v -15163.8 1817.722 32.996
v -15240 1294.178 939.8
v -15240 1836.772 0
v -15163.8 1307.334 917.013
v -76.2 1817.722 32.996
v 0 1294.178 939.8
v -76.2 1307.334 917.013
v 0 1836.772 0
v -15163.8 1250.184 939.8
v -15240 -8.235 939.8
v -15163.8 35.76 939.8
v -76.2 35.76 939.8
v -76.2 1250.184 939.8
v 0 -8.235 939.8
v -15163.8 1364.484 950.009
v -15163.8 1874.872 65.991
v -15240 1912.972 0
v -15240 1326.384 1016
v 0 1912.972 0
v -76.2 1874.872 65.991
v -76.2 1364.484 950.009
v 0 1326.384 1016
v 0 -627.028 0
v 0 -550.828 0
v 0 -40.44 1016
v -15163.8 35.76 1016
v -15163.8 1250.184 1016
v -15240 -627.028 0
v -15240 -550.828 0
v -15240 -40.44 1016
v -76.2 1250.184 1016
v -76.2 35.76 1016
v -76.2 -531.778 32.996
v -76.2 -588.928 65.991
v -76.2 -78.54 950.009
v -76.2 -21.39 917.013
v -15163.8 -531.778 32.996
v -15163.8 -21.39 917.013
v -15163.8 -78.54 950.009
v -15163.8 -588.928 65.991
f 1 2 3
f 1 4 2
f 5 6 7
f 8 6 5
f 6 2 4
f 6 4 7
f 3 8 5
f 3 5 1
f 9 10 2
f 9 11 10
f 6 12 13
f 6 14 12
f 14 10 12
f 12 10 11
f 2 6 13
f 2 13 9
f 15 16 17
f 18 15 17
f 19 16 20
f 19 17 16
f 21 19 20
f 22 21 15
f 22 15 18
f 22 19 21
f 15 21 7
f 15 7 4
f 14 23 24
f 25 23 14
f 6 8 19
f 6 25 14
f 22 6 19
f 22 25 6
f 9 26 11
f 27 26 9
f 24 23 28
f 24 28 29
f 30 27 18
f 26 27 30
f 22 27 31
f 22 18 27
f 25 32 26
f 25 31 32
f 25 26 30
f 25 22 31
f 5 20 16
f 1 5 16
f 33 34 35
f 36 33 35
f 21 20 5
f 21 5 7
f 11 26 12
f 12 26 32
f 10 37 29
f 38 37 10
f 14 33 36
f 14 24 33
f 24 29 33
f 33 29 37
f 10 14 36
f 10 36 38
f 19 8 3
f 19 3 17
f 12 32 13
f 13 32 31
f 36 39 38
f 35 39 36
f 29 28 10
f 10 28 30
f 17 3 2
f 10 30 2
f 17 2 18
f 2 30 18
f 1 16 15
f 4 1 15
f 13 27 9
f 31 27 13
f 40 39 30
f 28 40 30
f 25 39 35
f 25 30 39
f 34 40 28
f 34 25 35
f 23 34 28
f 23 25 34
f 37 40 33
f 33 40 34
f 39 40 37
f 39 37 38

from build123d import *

# Parameters (mm, degrees)
F1_DEPTH = 15240
F2_W     = 15087.6
F2_H     = 1020.7757469933
F3_DEPTH = 76.2
F4_W     = 15087.6
F4_H     = 1214.4242530067
F5_DEPTH = 76.2
F6_W     = 15087.6
F6_H     = 1020.7757469933
F7_DEPTH = 76.2


with BuildPart() as f1:
    # F0 (on Right) → F1 (new body)
    with BuildSketch(Plane.YZ):
        Polygon((-40.4404837035, 1016), (-627.0283572002, 0), (-550.8283572002, 0), (-8.2345742158, 939.8), (1294.1778598154, 939.8), (1836.7716427998, 0), (1912.9716427998, 0), (1326.3837693031, 1016), align=None)
    extrude(amount=-F1_DEPTH)

    # F2 (on face) → F3 (cut)
    with BuildSketch(Plane(origin=(0, -470.2712679001, 271.5112431143), x_dir=(1, 0, 0), z_dir=(0, -0.8660254038, 0.5))):
        with Locations((-7620, 273.0736948966)):
            Rectangle(F2_W, F2_H)
    extrude(amount=-F3_DEPTH, mode=Mode.SUBTRACT)

    # F4 (on face) → F5 (cut)
    with BuildSketch(Plane.XY.offset(1016)):
        with Locations((-7620, 642.9716427998)):
            Rectangle(F4_W, F4_H)
    extrude(amount=-F5_DEPTH, mode=Mode.SUBTRACT)

    # F6 (on face) → F7 (cut)
    with BuildSketch(Plane(origin=(0, 1434.7287320999, 828.3410196919), x_dir=(-1, 0, 0), z_dir=(0, 0.8660254038, 0.5))):
        with Locations((7620, -369.8979479032)):
            Rectangle(F6_W, F6_H)
    extrude(amount=-F7_DEPTH, mode=Mode.SUBTRACT)


solid = f1.part
